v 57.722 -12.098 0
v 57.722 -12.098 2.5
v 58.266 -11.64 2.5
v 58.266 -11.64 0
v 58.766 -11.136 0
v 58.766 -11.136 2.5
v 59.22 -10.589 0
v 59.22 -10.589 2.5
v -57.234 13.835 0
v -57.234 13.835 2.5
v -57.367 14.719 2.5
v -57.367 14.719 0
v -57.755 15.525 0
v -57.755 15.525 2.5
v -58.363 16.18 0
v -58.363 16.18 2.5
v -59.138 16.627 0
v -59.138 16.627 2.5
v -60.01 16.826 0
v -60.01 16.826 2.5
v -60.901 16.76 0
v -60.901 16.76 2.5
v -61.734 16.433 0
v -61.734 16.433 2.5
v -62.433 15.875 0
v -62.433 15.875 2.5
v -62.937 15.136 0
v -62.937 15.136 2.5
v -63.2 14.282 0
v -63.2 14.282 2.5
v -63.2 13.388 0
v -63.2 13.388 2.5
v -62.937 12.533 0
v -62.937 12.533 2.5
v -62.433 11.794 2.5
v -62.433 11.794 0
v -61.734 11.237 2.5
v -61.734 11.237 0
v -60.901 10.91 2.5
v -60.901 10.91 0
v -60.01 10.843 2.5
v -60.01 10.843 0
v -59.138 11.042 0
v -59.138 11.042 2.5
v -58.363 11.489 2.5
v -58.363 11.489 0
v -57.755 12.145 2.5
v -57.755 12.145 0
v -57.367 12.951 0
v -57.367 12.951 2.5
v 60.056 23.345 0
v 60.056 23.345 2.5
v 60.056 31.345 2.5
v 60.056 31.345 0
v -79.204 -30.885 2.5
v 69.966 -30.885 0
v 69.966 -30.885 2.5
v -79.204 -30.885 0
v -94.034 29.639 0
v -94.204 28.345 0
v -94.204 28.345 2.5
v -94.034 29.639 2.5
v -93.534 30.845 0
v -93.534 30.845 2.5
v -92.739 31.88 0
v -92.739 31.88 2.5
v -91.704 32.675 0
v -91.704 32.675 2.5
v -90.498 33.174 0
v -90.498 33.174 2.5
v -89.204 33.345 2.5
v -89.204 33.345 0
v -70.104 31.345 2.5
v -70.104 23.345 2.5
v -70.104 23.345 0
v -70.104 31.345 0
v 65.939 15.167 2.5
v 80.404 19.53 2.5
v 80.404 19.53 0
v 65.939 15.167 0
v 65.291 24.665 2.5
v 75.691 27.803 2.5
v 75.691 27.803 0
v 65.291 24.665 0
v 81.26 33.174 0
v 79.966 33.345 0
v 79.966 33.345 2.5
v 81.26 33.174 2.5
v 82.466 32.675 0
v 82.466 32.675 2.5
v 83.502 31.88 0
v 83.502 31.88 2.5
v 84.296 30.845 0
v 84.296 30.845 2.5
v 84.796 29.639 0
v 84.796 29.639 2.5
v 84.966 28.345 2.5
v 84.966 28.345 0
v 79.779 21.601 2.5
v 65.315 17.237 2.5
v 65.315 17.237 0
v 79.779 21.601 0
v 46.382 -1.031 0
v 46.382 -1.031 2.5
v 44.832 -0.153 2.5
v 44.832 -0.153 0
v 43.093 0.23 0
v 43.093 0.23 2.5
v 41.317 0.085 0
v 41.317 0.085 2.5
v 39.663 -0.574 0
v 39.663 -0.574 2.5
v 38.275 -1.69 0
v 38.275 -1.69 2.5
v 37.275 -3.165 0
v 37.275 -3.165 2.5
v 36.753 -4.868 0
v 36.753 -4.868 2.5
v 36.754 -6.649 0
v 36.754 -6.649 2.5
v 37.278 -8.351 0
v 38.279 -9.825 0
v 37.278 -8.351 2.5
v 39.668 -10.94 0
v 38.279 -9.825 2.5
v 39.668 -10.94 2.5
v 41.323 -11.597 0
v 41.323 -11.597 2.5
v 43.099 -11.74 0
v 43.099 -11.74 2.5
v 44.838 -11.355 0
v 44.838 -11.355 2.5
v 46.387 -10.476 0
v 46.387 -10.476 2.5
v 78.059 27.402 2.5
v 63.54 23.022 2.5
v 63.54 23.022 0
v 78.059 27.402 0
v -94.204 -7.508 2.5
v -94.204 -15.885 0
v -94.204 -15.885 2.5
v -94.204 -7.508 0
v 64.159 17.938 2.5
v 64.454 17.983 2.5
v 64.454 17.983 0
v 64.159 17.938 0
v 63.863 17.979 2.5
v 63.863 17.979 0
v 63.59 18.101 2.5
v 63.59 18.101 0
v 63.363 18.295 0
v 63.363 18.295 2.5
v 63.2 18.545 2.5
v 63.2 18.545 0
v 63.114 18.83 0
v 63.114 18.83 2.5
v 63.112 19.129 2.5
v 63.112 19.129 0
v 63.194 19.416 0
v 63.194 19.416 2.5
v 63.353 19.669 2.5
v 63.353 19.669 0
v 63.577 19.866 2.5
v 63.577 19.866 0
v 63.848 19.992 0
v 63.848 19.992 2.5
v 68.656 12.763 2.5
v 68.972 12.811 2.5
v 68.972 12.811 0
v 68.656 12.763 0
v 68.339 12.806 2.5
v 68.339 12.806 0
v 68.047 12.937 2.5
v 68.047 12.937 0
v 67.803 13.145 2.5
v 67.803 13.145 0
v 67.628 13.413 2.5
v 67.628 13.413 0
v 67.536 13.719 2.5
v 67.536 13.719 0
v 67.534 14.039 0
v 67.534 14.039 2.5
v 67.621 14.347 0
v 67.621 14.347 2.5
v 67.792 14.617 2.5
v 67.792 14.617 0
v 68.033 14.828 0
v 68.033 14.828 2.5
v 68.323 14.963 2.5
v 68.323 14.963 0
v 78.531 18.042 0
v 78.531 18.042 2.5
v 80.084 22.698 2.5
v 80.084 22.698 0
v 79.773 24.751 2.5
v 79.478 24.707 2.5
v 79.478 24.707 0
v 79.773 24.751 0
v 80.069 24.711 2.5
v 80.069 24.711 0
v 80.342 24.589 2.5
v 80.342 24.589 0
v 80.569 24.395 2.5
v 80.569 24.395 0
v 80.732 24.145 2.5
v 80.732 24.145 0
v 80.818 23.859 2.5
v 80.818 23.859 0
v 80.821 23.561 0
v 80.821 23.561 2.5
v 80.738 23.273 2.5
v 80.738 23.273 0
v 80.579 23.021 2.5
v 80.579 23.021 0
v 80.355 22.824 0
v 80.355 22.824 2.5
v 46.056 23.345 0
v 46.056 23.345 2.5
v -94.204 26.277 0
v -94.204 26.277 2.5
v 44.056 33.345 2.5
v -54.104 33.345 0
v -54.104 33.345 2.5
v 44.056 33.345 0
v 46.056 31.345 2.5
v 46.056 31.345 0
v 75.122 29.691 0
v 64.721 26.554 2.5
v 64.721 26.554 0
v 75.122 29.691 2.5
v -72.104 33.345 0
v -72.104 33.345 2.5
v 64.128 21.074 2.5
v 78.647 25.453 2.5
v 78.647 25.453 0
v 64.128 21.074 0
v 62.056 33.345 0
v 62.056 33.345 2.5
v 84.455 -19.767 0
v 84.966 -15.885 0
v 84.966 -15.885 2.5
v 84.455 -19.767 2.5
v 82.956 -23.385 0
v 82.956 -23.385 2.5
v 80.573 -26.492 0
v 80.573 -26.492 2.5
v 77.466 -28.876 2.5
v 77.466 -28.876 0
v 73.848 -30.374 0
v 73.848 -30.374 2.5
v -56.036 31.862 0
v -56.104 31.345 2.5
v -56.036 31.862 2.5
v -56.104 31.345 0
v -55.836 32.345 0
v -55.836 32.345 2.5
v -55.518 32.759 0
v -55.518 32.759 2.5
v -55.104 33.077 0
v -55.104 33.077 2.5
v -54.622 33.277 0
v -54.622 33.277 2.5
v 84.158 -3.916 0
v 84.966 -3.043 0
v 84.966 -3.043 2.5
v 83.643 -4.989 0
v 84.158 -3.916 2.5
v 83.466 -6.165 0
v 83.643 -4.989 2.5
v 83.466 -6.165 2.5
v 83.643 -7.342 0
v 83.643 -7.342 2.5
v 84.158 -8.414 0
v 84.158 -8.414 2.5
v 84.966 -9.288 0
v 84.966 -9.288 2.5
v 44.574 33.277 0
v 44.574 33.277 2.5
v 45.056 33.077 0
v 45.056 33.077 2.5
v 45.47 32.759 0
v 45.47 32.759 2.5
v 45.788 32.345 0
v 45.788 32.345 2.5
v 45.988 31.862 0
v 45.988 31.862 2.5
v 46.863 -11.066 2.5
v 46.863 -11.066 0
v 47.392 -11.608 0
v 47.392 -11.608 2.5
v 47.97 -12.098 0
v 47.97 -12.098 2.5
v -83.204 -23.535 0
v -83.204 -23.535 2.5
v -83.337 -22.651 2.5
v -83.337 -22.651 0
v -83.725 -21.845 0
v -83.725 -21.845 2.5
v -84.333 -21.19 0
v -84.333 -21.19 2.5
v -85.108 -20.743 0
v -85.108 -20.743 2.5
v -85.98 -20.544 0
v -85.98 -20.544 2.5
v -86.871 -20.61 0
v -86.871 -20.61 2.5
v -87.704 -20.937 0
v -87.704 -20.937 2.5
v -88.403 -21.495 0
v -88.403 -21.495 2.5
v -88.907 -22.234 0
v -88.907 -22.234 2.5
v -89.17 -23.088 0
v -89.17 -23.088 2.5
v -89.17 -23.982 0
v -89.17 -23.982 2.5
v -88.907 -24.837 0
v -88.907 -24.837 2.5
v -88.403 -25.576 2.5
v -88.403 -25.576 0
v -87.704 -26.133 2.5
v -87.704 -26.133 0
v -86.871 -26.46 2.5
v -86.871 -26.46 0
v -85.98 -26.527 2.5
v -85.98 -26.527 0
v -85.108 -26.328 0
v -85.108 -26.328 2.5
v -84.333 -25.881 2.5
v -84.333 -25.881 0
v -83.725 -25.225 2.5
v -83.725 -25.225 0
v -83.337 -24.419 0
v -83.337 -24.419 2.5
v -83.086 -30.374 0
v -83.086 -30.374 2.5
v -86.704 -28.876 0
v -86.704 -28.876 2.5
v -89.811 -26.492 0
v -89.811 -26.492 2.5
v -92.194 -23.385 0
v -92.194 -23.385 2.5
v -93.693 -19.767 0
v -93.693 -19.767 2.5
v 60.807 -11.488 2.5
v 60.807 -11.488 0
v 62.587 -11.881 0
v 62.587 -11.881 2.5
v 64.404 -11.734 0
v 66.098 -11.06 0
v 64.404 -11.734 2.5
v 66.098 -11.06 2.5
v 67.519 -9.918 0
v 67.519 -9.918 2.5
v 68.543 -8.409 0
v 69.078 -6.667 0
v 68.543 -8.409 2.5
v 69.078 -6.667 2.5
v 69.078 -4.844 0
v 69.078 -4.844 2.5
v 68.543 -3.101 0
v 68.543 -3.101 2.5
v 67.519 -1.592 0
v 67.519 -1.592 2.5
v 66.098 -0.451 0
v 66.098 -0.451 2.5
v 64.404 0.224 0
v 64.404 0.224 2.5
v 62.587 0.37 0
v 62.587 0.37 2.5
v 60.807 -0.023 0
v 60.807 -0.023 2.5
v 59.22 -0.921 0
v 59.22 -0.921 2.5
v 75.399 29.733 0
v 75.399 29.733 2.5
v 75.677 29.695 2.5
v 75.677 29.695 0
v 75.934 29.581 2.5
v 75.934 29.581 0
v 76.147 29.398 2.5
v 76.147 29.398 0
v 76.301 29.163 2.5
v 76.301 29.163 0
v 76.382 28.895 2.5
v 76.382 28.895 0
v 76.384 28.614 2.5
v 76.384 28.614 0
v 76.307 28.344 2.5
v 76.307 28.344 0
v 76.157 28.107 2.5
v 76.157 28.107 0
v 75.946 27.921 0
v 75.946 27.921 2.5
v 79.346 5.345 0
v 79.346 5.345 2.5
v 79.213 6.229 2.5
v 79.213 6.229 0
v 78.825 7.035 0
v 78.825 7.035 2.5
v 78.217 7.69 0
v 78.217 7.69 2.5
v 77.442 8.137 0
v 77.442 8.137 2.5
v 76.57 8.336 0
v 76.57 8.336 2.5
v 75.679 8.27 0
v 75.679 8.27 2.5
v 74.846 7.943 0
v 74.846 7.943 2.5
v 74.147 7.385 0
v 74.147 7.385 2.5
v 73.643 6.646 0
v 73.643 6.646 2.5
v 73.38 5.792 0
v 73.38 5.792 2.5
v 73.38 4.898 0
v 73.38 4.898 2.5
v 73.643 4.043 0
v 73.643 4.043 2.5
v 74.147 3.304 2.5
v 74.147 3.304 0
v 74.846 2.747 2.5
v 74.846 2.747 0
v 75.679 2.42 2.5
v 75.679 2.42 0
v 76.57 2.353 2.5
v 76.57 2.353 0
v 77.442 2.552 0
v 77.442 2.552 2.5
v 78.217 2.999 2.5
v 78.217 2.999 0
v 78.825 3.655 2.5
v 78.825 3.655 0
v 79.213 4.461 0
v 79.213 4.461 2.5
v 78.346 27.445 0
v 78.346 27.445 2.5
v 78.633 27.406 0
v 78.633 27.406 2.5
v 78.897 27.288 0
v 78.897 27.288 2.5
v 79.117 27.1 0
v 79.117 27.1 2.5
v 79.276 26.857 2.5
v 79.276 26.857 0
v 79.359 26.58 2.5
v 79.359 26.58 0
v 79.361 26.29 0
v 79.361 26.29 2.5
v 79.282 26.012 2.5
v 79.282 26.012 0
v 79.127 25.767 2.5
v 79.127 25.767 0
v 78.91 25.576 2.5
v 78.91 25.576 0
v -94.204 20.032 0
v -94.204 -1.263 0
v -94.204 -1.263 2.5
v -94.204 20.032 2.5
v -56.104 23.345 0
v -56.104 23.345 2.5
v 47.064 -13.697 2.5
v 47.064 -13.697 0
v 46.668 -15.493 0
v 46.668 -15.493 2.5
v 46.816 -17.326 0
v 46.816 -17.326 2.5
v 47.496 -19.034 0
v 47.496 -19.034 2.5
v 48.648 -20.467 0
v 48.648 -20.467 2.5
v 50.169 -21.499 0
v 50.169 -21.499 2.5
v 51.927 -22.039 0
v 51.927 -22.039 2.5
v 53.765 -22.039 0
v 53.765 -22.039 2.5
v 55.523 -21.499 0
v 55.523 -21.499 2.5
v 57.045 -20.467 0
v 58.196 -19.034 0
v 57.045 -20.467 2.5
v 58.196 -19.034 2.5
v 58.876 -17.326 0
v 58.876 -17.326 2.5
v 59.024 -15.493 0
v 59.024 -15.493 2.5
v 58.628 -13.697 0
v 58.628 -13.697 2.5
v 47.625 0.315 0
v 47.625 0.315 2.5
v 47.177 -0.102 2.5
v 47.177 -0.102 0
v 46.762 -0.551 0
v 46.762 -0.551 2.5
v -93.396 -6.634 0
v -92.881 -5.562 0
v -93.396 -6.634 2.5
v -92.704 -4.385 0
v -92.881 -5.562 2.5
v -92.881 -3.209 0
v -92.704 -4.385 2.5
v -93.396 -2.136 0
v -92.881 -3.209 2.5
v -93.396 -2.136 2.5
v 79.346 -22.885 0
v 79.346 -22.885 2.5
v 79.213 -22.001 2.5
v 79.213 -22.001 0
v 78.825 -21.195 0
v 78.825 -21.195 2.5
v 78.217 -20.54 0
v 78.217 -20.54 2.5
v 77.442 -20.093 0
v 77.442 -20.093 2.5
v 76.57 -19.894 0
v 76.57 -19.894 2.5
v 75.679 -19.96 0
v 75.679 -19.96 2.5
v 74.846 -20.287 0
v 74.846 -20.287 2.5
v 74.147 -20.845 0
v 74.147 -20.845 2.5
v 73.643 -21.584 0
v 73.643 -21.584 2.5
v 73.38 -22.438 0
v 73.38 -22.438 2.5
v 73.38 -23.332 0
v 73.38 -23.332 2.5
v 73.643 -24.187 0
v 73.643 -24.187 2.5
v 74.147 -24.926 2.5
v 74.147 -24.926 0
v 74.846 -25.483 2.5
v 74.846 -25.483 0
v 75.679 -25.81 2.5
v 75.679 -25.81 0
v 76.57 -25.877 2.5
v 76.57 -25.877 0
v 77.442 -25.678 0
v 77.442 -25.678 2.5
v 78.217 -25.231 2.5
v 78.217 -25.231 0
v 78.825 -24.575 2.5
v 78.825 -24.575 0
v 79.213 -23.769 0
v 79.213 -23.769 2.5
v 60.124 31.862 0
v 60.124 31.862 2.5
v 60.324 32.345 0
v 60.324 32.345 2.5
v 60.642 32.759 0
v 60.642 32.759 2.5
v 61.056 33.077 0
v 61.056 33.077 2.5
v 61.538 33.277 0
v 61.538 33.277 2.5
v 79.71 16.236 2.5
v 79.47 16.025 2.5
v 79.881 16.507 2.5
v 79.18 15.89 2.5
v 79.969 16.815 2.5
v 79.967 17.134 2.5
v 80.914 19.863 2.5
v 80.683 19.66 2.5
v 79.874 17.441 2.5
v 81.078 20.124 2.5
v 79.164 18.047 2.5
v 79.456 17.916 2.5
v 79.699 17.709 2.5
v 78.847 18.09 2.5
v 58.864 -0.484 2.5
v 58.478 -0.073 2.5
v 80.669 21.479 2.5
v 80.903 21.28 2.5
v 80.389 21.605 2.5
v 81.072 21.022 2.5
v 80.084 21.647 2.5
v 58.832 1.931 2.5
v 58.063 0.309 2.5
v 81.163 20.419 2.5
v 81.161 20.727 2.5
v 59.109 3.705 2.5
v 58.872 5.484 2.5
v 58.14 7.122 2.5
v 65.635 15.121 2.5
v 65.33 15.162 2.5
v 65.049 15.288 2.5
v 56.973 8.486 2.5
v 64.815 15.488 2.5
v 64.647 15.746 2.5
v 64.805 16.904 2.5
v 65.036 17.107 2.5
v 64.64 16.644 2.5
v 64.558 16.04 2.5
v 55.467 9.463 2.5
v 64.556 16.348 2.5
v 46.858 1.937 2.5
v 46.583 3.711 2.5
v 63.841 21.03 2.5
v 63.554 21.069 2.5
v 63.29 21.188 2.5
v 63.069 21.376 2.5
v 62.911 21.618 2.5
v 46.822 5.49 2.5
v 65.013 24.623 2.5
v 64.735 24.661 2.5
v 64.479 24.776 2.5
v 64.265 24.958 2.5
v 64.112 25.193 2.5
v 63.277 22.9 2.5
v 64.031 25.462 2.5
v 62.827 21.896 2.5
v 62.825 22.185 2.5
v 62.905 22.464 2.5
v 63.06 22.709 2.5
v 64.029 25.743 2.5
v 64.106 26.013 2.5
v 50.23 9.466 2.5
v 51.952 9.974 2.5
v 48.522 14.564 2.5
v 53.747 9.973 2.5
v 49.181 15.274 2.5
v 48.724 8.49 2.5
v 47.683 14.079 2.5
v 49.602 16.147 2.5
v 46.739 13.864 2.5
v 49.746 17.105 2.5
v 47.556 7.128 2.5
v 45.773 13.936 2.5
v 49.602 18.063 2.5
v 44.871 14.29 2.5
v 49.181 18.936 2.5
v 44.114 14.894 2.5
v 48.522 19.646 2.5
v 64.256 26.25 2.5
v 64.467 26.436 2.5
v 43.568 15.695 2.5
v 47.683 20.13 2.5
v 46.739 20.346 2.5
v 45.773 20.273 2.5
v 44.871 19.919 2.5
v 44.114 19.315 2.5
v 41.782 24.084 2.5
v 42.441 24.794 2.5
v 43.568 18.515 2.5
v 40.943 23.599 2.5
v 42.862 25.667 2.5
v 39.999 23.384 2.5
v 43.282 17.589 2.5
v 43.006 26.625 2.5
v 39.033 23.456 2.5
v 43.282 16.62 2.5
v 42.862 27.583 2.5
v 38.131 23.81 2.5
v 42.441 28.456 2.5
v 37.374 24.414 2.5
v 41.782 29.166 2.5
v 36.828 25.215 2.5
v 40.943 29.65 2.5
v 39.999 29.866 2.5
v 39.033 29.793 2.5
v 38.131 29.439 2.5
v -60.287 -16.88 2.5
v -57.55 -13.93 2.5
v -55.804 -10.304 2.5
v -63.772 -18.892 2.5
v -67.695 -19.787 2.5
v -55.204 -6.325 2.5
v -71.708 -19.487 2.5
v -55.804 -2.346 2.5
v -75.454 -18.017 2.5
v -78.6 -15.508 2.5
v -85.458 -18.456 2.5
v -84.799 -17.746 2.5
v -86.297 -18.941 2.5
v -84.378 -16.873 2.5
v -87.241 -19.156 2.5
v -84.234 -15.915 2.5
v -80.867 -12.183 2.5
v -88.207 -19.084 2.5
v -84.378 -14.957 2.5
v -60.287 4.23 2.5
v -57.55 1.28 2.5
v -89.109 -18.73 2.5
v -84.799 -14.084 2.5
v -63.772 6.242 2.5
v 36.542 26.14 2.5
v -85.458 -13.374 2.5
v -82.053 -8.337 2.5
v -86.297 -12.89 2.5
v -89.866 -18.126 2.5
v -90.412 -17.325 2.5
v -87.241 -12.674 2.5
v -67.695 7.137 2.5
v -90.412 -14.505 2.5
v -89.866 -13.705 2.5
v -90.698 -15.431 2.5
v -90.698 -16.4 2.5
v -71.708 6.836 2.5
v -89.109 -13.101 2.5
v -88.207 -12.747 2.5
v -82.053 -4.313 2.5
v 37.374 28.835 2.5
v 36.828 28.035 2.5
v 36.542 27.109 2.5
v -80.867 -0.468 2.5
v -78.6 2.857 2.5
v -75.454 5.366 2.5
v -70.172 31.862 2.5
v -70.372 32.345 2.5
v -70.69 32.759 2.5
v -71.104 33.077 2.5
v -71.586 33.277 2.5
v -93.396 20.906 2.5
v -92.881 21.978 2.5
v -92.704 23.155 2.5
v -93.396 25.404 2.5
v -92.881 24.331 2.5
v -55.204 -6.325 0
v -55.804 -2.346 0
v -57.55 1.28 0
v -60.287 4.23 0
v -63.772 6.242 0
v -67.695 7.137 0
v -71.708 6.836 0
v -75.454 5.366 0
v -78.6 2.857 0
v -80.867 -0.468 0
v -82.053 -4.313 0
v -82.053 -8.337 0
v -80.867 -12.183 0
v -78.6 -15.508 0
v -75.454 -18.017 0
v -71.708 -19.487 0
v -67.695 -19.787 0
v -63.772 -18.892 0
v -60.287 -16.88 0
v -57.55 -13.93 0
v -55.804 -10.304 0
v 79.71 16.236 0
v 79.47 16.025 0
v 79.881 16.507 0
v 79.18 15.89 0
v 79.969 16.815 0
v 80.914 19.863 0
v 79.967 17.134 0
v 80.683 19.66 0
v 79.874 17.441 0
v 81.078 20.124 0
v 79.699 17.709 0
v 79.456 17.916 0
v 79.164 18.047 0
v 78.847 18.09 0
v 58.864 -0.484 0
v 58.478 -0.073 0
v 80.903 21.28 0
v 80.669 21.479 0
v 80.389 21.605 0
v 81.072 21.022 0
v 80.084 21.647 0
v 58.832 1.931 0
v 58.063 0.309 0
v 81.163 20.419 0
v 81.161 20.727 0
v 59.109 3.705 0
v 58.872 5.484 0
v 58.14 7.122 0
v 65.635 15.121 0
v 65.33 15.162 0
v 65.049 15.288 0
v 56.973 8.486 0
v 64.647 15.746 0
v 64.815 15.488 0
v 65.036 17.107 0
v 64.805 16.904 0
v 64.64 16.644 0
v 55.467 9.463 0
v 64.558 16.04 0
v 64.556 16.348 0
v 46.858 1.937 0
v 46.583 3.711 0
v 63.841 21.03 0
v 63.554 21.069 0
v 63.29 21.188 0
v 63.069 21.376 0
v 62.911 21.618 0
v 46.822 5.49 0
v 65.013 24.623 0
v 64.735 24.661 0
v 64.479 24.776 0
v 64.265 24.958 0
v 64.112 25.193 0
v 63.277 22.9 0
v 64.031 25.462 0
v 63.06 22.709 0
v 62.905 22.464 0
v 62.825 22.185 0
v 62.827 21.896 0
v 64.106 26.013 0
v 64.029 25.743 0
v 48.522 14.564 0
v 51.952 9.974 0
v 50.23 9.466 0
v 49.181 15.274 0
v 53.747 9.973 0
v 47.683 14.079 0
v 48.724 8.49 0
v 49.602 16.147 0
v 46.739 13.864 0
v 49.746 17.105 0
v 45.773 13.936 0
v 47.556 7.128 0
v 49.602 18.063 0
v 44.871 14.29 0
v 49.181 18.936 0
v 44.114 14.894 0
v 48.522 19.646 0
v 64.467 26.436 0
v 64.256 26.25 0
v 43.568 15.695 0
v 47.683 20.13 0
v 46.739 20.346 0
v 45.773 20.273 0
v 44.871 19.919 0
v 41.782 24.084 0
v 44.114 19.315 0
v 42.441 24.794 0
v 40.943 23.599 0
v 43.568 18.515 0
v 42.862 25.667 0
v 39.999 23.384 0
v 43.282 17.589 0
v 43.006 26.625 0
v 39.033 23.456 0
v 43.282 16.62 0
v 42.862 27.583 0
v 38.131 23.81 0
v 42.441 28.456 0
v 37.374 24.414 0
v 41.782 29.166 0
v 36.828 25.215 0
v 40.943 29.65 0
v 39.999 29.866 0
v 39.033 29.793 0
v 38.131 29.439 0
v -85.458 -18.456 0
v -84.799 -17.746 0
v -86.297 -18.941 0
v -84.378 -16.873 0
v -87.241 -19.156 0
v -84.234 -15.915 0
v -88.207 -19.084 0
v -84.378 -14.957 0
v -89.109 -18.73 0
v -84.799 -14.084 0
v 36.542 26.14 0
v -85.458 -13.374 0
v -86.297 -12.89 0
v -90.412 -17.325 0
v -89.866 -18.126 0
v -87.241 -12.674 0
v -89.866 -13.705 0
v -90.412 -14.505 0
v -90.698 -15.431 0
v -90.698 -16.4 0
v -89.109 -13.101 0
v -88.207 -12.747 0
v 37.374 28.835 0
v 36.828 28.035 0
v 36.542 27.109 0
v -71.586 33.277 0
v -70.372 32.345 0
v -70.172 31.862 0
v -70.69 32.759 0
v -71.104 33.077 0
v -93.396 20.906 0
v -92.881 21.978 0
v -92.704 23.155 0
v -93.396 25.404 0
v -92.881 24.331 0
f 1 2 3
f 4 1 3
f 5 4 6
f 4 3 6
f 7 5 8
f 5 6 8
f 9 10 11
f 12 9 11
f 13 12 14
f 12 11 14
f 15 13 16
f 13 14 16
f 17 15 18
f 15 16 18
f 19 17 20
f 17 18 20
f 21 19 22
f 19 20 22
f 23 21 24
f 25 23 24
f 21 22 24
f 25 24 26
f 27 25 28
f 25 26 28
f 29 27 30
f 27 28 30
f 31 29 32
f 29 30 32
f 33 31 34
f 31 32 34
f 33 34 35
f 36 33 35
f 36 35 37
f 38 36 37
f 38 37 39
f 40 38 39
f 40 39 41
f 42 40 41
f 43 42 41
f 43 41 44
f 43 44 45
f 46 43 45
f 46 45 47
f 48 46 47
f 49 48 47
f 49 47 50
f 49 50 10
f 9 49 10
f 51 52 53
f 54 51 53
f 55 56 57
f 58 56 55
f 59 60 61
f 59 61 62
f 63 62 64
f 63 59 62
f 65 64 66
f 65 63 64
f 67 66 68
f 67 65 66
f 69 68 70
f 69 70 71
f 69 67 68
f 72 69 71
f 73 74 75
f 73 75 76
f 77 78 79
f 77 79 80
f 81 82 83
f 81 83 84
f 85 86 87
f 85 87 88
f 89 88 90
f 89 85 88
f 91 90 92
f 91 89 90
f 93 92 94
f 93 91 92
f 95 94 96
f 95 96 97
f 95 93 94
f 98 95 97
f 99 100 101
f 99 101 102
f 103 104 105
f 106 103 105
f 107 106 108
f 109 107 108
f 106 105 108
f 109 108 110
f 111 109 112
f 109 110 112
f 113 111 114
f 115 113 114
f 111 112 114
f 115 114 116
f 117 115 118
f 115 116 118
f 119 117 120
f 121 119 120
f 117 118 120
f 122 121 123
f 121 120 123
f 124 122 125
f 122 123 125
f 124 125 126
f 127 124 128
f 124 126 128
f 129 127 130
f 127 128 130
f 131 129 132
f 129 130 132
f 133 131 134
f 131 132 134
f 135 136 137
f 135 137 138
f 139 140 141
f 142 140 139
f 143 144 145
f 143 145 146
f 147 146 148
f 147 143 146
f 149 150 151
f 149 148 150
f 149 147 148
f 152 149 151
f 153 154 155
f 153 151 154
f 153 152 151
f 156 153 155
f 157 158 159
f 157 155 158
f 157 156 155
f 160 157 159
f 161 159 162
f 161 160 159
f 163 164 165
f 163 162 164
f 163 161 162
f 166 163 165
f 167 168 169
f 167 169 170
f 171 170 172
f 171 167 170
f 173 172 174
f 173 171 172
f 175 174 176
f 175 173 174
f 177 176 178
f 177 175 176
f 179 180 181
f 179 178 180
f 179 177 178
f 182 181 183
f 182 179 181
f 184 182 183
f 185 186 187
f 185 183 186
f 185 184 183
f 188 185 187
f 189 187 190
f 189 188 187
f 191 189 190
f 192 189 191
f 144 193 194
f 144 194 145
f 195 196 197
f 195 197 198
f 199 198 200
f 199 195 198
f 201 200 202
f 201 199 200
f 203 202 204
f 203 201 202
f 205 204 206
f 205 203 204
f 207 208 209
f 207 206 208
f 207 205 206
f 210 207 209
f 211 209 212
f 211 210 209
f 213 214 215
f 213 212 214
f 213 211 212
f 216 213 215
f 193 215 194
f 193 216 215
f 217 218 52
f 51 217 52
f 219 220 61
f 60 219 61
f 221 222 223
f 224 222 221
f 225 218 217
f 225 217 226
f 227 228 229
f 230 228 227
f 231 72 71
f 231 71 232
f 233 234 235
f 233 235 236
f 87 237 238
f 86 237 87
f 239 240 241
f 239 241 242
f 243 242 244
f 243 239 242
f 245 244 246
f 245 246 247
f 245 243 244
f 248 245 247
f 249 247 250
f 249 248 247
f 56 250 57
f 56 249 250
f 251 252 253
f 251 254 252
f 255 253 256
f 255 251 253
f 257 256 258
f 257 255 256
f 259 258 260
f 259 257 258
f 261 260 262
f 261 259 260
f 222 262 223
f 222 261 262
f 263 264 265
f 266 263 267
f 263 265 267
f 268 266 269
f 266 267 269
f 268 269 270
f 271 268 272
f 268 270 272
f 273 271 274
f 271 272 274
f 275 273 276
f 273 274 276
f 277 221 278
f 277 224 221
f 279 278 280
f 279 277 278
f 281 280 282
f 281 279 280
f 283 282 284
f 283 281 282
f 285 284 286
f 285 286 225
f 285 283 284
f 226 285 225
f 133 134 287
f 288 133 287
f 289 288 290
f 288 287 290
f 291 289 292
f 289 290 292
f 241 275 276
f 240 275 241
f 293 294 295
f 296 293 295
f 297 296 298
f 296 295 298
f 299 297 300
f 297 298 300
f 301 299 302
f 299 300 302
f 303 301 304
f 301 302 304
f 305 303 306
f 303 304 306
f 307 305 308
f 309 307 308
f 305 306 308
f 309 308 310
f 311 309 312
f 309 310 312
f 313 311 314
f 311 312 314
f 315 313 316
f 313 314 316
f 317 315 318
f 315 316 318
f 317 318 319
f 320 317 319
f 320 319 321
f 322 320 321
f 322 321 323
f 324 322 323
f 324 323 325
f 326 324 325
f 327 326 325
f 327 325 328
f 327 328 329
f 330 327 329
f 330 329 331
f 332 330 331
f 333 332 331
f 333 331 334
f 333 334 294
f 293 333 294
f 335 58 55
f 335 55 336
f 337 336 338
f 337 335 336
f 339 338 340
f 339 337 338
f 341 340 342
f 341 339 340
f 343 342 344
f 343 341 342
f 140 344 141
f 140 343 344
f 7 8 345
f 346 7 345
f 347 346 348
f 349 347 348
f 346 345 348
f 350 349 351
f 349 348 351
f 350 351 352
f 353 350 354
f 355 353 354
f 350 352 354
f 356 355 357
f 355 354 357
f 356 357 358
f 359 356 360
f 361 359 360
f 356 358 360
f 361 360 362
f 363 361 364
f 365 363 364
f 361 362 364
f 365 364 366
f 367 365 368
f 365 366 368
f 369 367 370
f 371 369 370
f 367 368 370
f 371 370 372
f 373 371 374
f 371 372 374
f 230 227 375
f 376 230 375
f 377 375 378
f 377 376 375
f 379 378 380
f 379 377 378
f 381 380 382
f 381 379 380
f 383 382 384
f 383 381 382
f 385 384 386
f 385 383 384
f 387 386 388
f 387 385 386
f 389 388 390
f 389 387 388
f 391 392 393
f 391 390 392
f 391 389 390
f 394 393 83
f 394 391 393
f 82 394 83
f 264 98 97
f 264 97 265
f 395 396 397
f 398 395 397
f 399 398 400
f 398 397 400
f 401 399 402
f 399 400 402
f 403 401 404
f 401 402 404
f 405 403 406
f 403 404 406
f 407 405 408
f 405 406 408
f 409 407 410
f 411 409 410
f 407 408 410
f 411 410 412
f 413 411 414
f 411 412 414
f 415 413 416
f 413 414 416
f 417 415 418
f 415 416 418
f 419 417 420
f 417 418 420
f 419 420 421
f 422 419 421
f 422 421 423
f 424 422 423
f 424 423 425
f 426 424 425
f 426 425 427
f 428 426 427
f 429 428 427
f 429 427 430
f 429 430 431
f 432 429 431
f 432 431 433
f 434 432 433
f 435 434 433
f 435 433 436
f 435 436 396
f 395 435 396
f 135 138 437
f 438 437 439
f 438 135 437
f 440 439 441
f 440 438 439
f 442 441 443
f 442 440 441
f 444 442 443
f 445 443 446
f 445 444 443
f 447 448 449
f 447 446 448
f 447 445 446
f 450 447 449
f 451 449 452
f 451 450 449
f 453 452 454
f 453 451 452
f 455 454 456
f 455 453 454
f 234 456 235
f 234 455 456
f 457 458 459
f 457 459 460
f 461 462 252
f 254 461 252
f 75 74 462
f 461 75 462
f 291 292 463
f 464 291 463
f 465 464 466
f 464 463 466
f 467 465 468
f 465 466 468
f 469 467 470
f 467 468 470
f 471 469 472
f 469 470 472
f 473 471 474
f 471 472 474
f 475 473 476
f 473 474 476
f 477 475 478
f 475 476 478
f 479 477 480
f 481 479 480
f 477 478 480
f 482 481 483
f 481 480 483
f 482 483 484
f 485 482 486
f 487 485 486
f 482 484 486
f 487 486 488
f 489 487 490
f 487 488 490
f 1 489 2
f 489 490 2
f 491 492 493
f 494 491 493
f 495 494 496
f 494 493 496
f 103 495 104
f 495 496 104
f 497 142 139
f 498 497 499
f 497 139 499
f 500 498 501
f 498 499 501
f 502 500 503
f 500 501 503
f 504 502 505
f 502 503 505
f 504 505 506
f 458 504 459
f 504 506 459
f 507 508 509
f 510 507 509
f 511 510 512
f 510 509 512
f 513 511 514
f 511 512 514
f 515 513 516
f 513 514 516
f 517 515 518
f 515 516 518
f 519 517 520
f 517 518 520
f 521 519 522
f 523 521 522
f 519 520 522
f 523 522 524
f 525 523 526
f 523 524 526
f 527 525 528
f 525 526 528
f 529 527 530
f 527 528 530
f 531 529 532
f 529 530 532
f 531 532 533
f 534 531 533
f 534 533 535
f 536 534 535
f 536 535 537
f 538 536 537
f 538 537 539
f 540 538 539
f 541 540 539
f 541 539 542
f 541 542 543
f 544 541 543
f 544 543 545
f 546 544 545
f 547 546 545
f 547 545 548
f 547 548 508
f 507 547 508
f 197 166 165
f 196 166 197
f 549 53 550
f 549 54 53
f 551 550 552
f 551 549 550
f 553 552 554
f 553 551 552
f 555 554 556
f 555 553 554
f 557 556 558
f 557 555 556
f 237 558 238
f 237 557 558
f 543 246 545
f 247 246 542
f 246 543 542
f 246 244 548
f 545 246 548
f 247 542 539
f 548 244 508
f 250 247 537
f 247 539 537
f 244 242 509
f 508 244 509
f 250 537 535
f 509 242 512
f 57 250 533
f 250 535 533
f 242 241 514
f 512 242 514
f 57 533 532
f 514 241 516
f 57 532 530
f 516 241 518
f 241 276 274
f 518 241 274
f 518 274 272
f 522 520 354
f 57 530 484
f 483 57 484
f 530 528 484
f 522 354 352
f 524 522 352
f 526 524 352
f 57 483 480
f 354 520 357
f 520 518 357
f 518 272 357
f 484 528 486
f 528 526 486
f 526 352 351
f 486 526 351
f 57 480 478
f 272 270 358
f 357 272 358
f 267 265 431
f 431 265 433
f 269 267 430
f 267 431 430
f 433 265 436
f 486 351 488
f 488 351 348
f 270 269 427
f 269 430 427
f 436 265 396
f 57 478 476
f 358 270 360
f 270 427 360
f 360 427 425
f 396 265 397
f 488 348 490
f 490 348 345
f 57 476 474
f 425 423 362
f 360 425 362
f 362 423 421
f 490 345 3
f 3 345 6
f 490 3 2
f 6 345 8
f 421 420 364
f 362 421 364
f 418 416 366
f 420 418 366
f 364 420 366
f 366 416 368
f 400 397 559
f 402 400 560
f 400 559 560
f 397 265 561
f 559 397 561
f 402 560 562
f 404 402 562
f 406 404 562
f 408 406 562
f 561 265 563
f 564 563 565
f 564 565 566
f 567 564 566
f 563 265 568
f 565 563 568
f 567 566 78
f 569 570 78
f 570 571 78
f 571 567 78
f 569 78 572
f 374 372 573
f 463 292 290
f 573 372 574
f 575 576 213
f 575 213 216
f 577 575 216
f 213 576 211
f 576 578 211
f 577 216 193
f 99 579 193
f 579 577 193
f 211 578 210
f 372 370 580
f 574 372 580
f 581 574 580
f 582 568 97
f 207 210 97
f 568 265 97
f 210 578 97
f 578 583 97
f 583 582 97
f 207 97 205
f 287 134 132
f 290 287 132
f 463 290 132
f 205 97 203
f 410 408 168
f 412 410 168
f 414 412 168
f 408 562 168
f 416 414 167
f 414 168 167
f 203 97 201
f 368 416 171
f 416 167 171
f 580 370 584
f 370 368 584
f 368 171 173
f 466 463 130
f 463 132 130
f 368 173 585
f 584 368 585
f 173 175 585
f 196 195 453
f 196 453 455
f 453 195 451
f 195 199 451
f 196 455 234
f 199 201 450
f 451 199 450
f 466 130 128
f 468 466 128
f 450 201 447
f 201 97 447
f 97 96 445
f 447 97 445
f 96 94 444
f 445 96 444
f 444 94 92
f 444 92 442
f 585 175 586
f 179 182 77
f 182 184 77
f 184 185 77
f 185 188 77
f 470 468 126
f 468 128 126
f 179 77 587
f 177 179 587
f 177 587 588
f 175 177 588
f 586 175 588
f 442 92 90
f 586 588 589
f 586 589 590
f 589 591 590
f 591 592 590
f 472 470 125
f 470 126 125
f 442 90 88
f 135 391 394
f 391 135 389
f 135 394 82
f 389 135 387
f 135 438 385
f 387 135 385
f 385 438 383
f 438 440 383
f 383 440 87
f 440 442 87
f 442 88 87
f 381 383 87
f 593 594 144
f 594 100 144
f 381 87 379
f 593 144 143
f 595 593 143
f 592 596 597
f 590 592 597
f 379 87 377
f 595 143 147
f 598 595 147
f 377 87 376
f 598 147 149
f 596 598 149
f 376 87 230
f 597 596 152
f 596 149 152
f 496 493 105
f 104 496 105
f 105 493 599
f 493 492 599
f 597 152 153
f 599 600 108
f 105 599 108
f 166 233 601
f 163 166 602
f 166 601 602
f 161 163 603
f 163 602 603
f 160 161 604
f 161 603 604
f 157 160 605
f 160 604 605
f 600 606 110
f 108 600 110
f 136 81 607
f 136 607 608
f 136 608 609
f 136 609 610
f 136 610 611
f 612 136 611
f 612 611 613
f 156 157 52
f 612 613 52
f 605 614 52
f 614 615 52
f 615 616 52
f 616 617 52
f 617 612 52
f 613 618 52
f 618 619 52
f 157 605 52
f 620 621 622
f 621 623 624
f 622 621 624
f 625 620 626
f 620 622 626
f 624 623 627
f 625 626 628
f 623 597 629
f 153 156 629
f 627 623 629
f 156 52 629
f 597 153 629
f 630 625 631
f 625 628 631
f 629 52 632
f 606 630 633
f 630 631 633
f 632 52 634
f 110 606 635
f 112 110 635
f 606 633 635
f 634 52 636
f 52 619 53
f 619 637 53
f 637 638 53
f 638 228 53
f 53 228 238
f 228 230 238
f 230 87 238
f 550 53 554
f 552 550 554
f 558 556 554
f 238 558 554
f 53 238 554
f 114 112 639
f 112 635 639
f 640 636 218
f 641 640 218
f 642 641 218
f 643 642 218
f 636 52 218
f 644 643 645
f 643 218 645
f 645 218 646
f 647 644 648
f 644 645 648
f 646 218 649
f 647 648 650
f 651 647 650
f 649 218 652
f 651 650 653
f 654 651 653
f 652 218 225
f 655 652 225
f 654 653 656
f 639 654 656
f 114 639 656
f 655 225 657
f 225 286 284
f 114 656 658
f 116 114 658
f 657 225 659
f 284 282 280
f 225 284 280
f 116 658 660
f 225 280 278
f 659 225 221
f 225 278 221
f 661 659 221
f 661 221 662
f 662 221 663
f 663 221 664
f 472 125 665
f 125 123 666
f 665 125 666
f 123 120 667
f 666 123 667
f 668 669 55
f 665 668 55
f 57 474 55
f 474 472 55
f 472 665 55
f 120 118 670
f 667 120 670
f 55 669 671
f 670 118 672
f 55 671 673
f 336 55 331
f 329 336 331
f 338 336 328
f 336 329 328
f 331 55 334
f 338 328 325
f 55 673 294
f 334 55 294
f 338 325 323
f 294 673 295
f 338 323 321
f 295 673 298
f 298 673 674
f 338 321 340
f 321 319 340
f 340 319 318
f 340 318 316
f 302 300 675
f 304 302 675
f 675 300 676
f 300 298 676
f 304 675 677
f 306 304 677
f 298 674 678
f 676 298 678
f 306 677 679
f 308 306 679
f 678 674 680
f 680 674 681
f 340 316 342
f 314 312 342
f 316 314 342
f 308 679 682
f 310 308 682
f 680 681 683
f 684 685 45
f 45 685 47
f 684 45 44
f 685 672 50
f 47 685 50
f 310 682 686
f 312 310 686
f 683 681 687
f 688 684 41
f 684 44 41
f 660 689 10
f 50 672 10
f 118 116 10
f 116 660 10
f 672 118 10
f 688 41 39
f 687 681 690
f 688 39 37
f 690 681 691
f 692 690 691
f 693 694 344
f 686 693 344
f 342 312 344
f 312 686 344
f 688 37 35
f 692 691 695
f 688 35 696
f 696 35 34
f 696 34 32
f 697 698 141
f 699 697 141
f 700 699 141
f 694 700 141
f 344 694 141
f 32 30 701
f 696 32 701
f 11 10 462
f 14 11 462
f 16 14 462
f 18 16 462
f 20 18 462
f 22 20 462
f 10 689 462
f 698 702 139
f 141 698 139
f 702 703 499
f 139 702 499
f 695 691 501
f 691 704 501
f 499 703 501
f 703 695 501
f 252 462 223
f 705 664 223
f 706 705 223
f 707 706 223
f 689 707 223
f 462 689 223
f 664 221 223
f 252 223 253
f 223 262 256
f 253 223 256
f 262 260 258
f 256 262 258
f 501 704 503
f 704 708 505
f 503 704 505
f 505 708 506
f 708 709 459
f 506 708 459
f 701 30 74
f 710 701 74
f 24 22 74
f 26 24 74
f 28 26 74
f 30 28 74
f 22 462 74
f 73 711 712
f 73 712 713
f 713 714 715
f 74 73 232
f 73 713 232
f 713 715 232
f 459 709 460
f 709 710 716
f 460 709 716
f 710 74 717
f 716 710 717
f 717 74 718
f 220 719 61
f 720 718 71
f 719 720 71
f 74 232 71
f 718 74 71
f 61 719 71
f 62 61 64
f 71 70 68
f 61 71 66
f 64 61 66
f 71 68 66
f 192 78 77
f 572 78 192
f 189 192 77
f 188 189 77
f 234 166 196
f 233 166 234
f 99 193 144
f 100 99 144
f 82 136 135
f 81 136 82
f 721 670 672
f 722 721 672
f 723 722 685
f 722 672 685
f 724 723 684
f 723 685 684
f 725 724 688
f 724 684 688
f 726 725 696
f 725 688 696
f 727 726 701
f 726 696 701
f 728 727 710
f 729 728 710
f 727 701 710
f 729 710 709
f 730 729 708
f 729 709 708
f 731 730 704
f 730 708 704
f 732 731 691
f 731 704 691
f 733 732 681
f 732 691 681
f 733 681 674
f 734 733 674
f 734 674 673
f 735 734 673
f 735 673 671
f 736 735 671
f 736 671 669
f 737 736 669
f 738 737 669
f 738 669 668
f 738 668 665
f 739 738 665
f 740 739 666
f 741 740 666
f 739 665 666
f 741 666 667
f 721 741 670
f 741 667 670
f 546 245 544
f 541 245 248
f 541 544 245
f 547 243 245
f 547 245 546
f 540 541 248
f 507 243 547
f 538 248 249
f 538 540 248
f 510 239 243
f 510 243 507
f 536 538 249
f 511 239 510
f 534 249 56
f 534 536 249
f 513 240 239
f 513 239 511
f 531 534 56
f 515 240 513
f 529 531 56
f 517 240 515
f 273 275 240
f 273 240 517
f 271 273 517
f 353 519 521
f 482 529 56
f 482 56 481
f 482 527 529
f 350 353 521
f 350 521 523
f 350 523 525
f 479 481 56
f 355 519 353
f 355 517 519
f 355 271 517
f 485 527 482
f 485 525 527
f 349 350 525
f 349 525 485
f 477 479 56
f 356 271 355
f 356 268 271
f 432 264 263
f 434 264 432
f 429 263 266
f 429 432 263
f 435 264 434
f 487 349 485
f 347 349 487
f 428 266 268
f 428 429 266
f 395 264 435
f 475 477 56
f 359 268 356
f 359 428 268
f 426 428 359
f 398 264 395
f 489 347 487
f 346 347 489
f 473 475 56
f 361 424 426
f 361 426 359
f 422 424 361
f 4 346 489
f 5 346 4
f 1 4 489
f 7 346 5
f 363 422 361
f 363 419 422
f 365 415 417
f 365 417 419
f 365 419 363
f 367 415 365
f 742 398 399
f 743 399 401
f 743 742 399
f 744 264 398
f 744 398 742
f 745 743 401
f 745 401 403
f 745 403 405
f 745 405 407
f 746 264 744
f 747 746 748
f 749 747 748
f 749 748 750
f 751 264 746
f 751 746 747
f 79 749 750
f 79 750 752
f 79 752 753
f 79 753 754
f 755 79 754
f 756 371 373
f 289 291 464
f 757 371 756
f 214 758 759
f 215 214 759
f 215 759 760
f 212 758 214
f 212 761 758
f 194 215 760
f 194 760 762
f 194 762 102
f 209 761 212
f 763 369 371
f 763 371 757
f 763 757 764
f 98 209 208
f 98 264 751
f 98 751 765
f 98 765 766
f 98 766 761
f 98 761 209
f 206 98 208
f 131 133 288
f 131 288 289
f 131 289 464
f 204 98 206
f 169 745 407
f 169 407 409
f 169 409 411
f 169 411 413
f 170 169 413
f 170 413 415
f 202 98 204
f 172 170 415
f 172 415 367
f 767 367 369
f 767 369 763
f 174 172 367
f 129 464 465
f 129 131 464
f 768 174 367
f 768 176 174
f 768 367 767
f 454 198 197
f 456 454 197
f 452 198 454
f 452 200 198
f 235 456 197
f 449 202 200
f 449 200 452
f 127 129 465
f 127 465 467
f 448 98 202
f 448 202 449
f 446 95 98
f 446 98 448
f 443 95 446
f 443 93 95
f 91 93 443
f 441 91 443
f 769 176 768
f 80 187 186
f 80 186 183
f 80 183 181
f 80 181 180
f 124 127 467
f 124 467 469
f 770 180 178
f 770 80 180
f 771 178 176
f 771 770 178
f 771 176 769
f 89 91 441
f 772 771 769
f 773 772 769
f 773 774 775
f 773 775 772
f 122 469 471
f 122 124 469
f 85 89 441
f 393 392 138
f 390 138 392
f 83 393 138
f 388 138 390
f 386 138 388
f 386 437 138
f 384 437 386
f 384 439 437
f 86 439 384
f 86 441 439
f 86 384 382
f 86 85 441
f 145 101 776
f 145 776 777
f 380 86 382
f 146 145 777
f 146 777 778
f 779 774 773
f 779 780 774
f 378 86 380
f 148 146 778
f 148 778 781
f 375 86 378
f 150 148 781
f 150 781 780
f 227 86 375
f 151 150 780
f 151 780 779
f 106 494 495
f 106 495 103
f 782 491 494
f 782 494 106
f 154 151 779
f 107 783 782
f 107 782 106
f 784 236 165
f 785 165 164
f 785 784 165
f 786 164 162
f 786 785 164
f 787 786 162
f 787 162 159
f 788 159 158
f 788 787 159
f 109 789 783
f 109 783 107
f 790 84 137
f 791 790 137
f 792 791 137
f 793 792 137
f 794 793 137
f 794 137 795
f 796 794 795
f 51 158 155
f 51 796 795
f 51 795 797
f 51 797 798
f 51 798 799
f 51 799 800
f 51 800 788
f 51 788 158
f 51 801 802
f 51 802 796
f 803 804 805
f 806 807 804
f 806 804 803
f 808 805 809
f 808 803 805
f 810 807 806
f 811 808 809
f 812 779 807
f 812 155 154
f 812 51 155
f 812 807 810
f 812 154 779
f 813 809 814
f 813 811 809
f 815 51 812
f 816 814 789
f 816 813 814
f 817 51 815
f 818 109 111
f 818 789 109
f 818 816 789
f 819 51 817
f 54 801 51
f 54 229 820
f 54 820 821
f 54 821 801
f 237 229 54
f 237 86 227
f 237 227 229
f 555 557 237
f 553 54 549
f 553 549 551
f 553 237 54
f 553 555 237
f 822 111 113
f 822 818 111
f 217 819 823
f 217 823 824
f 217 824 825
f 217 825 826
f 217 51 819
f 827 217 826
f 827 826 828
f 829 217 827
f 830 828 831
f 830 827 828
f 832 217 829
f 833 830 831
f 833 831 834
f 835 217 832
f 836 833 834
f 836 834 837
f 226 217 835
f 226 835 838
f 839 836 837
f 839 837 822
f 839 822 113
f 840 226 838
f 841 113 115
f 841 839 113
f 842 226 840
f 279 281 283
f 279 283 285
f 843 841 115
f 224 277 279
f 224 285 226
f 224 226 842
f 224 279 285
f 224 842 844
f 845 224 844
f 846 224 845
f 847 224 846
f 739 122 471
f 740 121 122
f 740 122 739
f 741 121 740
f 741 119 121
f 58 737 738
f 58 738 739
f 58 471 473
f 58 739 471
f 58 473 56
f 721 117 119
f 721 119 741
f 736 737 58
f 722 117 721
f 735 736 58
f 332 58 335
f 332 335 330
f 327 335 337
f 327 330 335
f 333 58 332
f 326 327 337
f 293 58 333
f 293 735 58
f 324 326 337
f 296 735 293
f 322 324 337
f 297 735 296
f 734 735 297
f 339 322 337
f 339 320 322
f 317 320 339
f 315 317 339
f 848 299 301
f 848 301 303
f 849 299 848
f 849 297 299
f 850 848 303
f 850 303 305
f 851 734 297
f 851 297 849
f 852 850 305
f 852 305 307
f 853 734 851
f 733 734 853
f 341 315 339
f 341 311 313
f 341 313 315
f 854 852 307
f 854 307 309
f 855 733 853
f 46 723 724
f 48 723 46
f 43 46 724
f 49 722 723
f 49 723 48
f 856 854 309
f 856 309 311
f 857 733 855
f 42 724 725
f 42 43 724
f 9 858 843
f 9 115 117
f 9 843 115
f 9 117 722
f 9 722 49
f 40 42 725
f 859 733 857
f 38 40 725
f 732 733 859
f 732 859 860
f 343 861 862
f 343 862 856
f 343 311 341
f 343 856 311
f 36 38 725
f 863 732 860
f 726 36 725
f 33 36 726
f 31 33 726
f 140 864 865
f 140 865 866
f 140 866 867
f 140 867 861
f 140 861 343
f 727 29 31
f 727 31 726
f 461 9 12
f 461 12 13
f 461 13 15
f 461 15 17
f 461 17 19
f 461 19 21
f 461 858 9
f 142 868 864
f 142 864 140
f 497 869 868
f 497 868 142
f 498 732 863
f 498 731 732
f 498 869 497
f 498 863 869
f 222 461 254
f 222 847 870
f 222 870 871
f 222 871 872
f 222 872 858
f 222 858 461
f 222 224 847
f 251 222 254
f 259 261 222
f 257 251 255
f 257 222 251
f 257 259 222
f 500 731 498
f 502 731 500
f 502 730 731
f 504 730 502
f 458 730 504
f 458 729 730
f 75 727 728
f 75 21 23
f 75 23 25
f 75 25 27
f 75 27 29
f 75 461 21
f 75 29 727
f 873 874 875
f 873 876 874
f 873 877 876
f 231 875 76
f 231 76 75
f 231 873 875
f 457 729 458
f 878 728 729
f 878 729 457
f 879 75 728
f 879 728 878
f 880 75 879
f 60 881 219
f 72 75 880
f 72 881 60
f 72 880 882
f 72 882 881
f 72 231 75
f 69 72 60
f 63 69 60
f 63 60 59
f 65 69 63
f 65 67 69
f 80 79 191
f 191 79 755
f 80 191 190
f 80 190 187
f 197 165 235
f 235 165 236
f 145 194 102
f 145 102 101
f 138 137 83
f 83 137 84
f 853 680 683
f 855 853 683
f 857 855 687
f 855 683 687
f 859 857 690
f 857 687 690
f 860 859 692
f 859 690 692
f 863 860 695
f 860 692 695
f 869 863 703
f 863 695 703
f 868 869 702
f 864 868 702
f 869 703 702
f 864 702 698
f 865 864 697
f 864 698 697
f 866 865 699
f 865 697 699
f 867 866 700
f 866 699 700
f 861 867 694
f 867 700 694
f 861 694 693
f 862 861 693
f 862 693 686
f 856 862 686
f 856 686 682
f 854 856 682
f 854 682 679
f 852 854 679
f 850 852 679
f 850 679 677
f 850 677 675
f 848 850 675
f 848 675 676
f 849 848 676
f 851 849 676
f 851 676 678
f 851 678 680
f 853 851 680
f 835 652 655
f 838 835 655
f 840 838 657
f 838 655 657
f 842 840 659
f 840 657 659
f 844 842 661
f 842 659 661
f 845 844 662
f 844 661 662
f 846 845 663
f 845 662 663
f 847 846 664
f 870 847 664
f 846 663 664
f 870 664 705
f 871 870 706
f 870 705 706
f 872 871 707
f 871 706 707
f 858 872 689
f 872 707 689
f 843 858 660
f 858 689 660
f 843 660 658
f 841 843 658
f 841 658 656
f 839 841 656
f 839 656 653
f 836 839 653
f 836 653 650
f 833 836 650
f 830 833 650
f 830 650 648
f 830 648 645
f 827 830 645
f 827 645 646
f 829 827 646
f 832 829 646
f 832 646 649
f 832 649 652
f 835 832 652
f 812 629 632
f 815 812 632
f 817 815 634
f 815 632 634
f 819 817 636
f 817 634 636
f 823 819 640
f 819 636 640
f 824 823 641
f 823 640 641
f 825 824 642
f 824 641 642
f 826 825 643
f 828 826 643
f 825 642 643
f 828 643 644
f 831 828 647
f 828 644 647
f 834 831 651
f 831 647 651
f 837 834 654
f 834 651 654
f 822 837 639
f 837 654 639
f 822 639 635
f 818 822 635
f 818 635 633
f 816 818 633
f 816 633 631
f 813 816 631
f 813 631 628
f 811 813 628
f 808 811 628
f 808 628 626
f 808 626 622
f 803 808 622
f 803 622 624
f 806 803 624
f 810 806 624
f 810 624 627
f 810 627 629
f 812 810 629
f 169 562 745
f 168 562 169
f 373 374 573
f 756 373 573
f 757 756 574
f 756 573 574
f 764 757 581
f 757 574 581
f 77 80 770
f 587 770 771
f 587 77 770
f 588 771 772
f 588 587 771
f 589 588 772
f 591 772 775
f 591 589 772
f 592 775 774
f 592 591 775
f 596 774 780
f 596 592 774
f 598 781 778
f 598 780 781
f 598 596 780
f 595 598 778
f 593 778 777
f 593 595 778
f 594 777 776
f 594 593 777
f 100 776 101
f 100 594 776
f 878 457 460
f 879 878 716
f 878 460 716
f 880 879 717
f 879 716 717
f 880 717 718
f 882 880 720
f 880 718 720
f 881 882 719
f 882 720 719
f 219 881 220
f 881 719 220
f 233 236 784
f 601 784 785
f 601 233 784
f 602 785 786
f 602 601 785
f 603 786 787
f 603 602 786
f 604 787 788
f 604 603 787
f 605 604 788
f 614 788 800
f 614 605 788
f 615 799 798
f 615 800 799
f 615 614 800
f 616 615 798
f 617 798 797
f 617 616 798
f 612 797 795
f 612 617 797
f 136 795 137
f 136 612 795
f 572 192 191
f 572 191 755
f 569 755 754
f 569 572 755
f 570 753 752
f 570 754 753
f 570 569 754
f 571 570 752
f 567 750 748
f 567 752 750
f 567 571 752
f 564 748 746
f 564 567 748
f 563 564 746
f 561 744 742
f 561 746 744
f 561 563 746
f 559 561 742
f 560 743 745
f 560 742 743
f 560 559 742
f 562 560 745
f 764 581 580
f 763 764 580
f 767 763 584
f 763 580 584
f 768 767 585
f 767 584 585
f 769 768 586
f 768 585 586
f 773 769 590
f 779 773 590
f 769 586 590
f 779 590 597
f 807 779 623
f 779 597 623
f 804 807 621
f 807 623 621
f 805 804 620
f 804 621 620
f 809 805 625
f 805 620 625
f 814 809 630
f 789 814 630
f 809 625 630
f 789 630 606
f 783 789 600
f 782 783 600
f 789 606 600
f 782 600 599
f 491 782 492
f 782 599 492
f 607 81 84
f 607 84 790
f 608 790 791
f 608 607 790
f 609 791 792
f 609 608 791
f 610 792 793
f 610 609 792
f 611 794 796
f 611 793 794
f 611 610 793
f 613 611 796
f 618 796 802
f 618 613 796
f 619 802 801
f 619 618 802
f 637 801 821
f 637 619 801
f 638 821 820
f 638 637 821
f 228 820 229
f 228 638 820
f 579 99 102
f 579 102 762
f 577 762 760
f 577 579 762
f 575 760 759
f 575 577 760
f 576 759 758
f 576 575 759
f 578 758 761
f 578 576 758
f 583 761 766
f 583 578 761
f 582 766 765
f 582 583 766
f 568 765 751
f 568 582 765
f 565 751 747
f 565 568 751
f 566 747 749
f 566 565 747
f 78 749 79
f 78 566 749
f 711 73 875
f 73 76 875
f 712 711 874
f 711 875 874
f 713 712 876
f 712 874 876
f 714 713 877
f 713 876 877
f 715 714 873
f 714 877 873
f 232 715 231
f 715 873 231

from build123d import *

# Parameters (mm, degrees)
BOSS_EXTRU_1_DEPTH       = 2.5
ENL_V_MAT_EXTRU_14_DEPTH = 10
JOYSTICK_R               = 13.5
ENL_V_MAT_EXTRU_2_DEPTH  = 2.5
ESQUISSE2_W              = 14
ESQUISSE2_H              = 10
ENL_V_MAT_EXTRU_3_DEPTH  = 10
CONG_1_R                 = 2
CONG_2_R                 = 2
ESQUISSE3_W              = 14
ESQUISSE3_H              = 10
ENL_V_MAT_EXTRU_4_DEPTH  = 10
CONG_3_R                 = 2
CONG_4_R                 = 2
ENL_V_MAT_EXTRU_8_DEPTH  = 10
ESQUISSE5_R              = 3
ESQUISSE5_R_2            = 3.25
ENL_V_MAT_EXTRU_9_DEPTH  = 10
ESQUISSE6_R              = 4
ENL_V_MAT_EXTRU_15_DEPTH = 10


with BuildPart() as part:
    # Esquisse1 → Boss.-Extru.1 (new body)
    with BuildSketch(Plane.XY):
        with BuildLine():
            Line((-89.203921136, 33.34478673), (79.966078864, 33.34478673))
            ThreePointArc((79.966078864, 33.34478673), (83.50161277, 31.880320636), (84.966078864, 28.34478673))
            Line((84.966078864, 28.34478673), (84.966078864, -15.88521327))
            ThreePointArc((84.966078864, -15.88521327), (80.572680581, -26.491814988), (69.966078864, -30.88521327))
            Line((69.966078864, -30.88521327), (-79.203921136, -30.88521327))
            ThreePointArc((-79.203921136, -30.88521327), (-89.810522854, -26.491814988), (-94.203921136, -15.88521327))
            Line((-94.203921136, -15.88521327), (-94.203921136, 28.34478673))
            ThreePointArc((-94.203921136, 28.34478673), (-92.739455042, 31.880320636), (-89.203921136, 33.34478673))
        make_face()
    extrude(amount=BOSS_EXTRU_1_DEPTH)

    # 12x12 Button → Enlèv. mat.-Extru.14 (cut)
    with BuildSketch(Plane.XY.offset(2.5)):
        with BuildLine():
            ThreePointArc((47.62517912, 0.314609491), (46.965240695, -0.322324083), (46.382477581, -1.030554452))
            ThreePointArc((46.382477581, -1.030554452), (36.687266101, -5.758353734), (46.387422405, -10.475999265))
            ThreePointArc((46.387422405, -10.475999265), (47.121070973, -11.343088385), (47.970121608, -12.097539697))
            ThreePointArc((47.970121608, -12.097539697), (52.846080853, -22.107917903), (57.722033666, -12.097536564))
            ThreePointArc((57.722033666, -12.097536564), (58.521539603, -11.393399627), (59.220393145, -10.589271343))
            ThreePointArc((59.220393145, -10.589271343), (69.146073474, -5.755216476), (59.220398192, -0.921151245))
            ThreePointArc((59.220398192, -0.921151245), (58.674503702, -0.275289323), (58.063482277, 0.309339821))
            ThreePointArc((58.063482276, 0.309339821), (52.849240894, 10.038221143), (47.62517912, 0.314609492))
        make_face()
    extrude(amount=-ENL_V_MAT_EXTRU_14_DEPTH, mode=Mode.SUBTRACT)

    # Joystick → Enlèv. mat.-Extru.2 (cut)
    with BuildSketch(Plane.XY.offset(2.5)):
        with Locations((-68.703921136, -6.32521327)):
            Circle(JOYSTICK_R)
    extrude(amount=-ENL_V_MAT_EXTRU_2_DEPTH, mode=Mode.SUBTRACT)

    # Esquisse2 → Enlèv. mat.-Extru.3 (cut)
    with BuildSketch(Plane.XY.offset(2.5)):
        with Locations((53.056078864, 28.34478673)):
            Rectangle(ESQUISSE2_W, ESQUISSE2_H)
    extrude(amount=-ENL_V_MAT_EXTRU_3_DEPTH, mode=Mode.SUBTRACT)

    # Congé1
    cong_1_edges = [part.edges().sort_by_distance(p)[0] for p in [
        (46.056078864, 33.34478673, 1.25),
    ]]
    fillet(cong_1_edges, radius=CONG_1_R)

    # Congé2
    cong_2_edges = [part.edges().sort_by_distance(p)[0] for p in [
        (60.056078864, 33.34478673, 1.25),
    ]]
    fillet(cong_2_edges, radius=CONG_2_R)

    # Esquisse3 → Enlèv. mat.-Extru.4 (cut)
    with BuildSketch(Plane.XY.offset(2.5)):
        with Locations((-63.103921136, 28.34478673)):
            Rectangle(ESQUISSE3_W, ESQUISSE3_H)
    extrude(amount=-ENL_V_MAT_EXTRU_4_DEPTH, mode=Mode.SUBTRACT)

    # Congé3
    cong_3_edges = [part.edges().sort_by_distance(p)[0] for p in [
        (-70.103921136, 33.34478673, 1.25),
    ]]
    fillet(cong_3_edges, radius=CONG_3_R)

    # Congé4
    cong_4_edges = [part.edges().sort_by_distance(p)[0] for p in [
        (-56.103921136, 33.34478673, 1.25),
    ]]
    fillet(cong_4_edges, radius=CONG_4_R)

    # Esquisse4 → Enlèv. mat.-Extru.8 (cut)
    with BuildSketch(Plane.XY.offset(2.5)):
        with BuildLine():
            Line((63.848163441, 19.991775112), (79.478036154, 24.706585194))
            ThreePointArc((79.478036154, 24.706585194), (80.785408643, 24.005170837), (80.083994286, 22.697798347))
            Line((80.083994286, 22.697798347), (64.454121573, 17.982988266))
            ThreePointArc((64.454121573, 17.982988266), (63.146749084, 18.684402623), (63.848163441, 19.991775112))
        make_face()
        with BuildLine():
            Line((63.539756046, 23.02230266), (78.059151304, 27.402133027))
            ThreePointArc((78.059151304, 27.402133027), (79.327394653, 26.721711723), (78.646973349, 25.453468374))
            Line((78.646973349, 25.453468374), (64.127578092, 21.073638007))
            ThreePointArc((64.127578092, 21.073638007), (62.859334743, 21.754059311), (63.539756046, 23.02230266))
        make_face()
        with BuildLine():
            Line((64.721267087, 26.554024385), (75.121728293, 29.691362753))
            ThreePointArc((75.121728293, 29.691362753), (76.350895216, 29.031906221), (75.691438685, 27.802739299))
            Line((75.691438685, 27.802739299), (65.290977478, 24.665400931))
            ThreePointArc((65.290977478, 24.665400931), (64.061810556, 25.324857462), (64.721267087, 26.554024385))
        make_face()
        with BuildLine():
            Line((65.314724126, 17.237366416), (79.779269942, 21.600651242))
            ThreePointArc((79.779269942, 21.600651242), (81.126757031, 20.877715126), (80.403820915, 19.530228036))
            Line((80.403820915, 19.530228036), (65.939275099, 15.166943211))
            ThreePointArc((65.939275099, 15.166943211), (64.591788009, 15.889879327), (65.314724126, 17.237366416))
        make_face()
        with BuildLine():
            Line((68.322797362, 14.963301678), (78.530507851, 18.042496065))
            ThreePointArc((78.530507851, 18.042496065), (79.931361718, 17.290928304), (79.179793957, 15.890074436))
            Line((79.179793957, 15.890074436), (68.972083468, 12.810880049))
            ThreePointArc((68.972083468, 12.810880049), (67.571229601, 13.562447811), (68.322797362, 14.963301678))
        make_face()
    extrude(amount=-ENL_V_MAT_EXTRU_8_DEPTH, mode=Mode.SUBTRACT)

    # Esquisse5 → Enlèv. mat.-Extru.9 (cut)
    with BuildSketch(Plane.XY.offset(2.5)):
        with Locations((76.346078864, -22.88521327)):
            Circle(ESQUISSE5_R)
        with Locations((-86.203921136, -23.53521327)):
            Circle(ESQUISSE5_R)
        with Locations((76.346078864, 5.34478673)):
            Circle(ESQUISSE5_R)
        with Locations((-60.233921136, 13.83478673)):
            Circle(ESQUISSE5_R)
        with Locations((-87.483921136, -15.91521327)):
            Circle(ESQUISSE5_R_2)
        with Locations((39.756078864, 26.62478673)):
            Circle(ESQUISSE5_R_2)
        with Locations((46.496078864, 17.10478673)):
            Circle(ESQUISSE5_R_2)
    extrude(amount=-ENL_V_MAT_EXTRU_9_DEPTH, mode=Mode.SUBTRACT)

    # Esquisse6 → Enlèv. mat.-Extru.15 (cut)
    with BuildSketch(Plane.XY.offset(2.5)):
        with Locations((-96.703921136, -4.38521327)):
            Circle(ESQUISSE6_R)
        with Locations((-96.703921136, 23.15478673)):
            Circle(ESQUISSE6_R)
        with Locations((87.466078864, -6.16521327)):
            Circle(ESQUISSE6_R)
    extrude(amount=-ENL_V_MAT_EXTRU_15_DEPTH, mode=Mode.SUBTRACT)


solid = part.part
